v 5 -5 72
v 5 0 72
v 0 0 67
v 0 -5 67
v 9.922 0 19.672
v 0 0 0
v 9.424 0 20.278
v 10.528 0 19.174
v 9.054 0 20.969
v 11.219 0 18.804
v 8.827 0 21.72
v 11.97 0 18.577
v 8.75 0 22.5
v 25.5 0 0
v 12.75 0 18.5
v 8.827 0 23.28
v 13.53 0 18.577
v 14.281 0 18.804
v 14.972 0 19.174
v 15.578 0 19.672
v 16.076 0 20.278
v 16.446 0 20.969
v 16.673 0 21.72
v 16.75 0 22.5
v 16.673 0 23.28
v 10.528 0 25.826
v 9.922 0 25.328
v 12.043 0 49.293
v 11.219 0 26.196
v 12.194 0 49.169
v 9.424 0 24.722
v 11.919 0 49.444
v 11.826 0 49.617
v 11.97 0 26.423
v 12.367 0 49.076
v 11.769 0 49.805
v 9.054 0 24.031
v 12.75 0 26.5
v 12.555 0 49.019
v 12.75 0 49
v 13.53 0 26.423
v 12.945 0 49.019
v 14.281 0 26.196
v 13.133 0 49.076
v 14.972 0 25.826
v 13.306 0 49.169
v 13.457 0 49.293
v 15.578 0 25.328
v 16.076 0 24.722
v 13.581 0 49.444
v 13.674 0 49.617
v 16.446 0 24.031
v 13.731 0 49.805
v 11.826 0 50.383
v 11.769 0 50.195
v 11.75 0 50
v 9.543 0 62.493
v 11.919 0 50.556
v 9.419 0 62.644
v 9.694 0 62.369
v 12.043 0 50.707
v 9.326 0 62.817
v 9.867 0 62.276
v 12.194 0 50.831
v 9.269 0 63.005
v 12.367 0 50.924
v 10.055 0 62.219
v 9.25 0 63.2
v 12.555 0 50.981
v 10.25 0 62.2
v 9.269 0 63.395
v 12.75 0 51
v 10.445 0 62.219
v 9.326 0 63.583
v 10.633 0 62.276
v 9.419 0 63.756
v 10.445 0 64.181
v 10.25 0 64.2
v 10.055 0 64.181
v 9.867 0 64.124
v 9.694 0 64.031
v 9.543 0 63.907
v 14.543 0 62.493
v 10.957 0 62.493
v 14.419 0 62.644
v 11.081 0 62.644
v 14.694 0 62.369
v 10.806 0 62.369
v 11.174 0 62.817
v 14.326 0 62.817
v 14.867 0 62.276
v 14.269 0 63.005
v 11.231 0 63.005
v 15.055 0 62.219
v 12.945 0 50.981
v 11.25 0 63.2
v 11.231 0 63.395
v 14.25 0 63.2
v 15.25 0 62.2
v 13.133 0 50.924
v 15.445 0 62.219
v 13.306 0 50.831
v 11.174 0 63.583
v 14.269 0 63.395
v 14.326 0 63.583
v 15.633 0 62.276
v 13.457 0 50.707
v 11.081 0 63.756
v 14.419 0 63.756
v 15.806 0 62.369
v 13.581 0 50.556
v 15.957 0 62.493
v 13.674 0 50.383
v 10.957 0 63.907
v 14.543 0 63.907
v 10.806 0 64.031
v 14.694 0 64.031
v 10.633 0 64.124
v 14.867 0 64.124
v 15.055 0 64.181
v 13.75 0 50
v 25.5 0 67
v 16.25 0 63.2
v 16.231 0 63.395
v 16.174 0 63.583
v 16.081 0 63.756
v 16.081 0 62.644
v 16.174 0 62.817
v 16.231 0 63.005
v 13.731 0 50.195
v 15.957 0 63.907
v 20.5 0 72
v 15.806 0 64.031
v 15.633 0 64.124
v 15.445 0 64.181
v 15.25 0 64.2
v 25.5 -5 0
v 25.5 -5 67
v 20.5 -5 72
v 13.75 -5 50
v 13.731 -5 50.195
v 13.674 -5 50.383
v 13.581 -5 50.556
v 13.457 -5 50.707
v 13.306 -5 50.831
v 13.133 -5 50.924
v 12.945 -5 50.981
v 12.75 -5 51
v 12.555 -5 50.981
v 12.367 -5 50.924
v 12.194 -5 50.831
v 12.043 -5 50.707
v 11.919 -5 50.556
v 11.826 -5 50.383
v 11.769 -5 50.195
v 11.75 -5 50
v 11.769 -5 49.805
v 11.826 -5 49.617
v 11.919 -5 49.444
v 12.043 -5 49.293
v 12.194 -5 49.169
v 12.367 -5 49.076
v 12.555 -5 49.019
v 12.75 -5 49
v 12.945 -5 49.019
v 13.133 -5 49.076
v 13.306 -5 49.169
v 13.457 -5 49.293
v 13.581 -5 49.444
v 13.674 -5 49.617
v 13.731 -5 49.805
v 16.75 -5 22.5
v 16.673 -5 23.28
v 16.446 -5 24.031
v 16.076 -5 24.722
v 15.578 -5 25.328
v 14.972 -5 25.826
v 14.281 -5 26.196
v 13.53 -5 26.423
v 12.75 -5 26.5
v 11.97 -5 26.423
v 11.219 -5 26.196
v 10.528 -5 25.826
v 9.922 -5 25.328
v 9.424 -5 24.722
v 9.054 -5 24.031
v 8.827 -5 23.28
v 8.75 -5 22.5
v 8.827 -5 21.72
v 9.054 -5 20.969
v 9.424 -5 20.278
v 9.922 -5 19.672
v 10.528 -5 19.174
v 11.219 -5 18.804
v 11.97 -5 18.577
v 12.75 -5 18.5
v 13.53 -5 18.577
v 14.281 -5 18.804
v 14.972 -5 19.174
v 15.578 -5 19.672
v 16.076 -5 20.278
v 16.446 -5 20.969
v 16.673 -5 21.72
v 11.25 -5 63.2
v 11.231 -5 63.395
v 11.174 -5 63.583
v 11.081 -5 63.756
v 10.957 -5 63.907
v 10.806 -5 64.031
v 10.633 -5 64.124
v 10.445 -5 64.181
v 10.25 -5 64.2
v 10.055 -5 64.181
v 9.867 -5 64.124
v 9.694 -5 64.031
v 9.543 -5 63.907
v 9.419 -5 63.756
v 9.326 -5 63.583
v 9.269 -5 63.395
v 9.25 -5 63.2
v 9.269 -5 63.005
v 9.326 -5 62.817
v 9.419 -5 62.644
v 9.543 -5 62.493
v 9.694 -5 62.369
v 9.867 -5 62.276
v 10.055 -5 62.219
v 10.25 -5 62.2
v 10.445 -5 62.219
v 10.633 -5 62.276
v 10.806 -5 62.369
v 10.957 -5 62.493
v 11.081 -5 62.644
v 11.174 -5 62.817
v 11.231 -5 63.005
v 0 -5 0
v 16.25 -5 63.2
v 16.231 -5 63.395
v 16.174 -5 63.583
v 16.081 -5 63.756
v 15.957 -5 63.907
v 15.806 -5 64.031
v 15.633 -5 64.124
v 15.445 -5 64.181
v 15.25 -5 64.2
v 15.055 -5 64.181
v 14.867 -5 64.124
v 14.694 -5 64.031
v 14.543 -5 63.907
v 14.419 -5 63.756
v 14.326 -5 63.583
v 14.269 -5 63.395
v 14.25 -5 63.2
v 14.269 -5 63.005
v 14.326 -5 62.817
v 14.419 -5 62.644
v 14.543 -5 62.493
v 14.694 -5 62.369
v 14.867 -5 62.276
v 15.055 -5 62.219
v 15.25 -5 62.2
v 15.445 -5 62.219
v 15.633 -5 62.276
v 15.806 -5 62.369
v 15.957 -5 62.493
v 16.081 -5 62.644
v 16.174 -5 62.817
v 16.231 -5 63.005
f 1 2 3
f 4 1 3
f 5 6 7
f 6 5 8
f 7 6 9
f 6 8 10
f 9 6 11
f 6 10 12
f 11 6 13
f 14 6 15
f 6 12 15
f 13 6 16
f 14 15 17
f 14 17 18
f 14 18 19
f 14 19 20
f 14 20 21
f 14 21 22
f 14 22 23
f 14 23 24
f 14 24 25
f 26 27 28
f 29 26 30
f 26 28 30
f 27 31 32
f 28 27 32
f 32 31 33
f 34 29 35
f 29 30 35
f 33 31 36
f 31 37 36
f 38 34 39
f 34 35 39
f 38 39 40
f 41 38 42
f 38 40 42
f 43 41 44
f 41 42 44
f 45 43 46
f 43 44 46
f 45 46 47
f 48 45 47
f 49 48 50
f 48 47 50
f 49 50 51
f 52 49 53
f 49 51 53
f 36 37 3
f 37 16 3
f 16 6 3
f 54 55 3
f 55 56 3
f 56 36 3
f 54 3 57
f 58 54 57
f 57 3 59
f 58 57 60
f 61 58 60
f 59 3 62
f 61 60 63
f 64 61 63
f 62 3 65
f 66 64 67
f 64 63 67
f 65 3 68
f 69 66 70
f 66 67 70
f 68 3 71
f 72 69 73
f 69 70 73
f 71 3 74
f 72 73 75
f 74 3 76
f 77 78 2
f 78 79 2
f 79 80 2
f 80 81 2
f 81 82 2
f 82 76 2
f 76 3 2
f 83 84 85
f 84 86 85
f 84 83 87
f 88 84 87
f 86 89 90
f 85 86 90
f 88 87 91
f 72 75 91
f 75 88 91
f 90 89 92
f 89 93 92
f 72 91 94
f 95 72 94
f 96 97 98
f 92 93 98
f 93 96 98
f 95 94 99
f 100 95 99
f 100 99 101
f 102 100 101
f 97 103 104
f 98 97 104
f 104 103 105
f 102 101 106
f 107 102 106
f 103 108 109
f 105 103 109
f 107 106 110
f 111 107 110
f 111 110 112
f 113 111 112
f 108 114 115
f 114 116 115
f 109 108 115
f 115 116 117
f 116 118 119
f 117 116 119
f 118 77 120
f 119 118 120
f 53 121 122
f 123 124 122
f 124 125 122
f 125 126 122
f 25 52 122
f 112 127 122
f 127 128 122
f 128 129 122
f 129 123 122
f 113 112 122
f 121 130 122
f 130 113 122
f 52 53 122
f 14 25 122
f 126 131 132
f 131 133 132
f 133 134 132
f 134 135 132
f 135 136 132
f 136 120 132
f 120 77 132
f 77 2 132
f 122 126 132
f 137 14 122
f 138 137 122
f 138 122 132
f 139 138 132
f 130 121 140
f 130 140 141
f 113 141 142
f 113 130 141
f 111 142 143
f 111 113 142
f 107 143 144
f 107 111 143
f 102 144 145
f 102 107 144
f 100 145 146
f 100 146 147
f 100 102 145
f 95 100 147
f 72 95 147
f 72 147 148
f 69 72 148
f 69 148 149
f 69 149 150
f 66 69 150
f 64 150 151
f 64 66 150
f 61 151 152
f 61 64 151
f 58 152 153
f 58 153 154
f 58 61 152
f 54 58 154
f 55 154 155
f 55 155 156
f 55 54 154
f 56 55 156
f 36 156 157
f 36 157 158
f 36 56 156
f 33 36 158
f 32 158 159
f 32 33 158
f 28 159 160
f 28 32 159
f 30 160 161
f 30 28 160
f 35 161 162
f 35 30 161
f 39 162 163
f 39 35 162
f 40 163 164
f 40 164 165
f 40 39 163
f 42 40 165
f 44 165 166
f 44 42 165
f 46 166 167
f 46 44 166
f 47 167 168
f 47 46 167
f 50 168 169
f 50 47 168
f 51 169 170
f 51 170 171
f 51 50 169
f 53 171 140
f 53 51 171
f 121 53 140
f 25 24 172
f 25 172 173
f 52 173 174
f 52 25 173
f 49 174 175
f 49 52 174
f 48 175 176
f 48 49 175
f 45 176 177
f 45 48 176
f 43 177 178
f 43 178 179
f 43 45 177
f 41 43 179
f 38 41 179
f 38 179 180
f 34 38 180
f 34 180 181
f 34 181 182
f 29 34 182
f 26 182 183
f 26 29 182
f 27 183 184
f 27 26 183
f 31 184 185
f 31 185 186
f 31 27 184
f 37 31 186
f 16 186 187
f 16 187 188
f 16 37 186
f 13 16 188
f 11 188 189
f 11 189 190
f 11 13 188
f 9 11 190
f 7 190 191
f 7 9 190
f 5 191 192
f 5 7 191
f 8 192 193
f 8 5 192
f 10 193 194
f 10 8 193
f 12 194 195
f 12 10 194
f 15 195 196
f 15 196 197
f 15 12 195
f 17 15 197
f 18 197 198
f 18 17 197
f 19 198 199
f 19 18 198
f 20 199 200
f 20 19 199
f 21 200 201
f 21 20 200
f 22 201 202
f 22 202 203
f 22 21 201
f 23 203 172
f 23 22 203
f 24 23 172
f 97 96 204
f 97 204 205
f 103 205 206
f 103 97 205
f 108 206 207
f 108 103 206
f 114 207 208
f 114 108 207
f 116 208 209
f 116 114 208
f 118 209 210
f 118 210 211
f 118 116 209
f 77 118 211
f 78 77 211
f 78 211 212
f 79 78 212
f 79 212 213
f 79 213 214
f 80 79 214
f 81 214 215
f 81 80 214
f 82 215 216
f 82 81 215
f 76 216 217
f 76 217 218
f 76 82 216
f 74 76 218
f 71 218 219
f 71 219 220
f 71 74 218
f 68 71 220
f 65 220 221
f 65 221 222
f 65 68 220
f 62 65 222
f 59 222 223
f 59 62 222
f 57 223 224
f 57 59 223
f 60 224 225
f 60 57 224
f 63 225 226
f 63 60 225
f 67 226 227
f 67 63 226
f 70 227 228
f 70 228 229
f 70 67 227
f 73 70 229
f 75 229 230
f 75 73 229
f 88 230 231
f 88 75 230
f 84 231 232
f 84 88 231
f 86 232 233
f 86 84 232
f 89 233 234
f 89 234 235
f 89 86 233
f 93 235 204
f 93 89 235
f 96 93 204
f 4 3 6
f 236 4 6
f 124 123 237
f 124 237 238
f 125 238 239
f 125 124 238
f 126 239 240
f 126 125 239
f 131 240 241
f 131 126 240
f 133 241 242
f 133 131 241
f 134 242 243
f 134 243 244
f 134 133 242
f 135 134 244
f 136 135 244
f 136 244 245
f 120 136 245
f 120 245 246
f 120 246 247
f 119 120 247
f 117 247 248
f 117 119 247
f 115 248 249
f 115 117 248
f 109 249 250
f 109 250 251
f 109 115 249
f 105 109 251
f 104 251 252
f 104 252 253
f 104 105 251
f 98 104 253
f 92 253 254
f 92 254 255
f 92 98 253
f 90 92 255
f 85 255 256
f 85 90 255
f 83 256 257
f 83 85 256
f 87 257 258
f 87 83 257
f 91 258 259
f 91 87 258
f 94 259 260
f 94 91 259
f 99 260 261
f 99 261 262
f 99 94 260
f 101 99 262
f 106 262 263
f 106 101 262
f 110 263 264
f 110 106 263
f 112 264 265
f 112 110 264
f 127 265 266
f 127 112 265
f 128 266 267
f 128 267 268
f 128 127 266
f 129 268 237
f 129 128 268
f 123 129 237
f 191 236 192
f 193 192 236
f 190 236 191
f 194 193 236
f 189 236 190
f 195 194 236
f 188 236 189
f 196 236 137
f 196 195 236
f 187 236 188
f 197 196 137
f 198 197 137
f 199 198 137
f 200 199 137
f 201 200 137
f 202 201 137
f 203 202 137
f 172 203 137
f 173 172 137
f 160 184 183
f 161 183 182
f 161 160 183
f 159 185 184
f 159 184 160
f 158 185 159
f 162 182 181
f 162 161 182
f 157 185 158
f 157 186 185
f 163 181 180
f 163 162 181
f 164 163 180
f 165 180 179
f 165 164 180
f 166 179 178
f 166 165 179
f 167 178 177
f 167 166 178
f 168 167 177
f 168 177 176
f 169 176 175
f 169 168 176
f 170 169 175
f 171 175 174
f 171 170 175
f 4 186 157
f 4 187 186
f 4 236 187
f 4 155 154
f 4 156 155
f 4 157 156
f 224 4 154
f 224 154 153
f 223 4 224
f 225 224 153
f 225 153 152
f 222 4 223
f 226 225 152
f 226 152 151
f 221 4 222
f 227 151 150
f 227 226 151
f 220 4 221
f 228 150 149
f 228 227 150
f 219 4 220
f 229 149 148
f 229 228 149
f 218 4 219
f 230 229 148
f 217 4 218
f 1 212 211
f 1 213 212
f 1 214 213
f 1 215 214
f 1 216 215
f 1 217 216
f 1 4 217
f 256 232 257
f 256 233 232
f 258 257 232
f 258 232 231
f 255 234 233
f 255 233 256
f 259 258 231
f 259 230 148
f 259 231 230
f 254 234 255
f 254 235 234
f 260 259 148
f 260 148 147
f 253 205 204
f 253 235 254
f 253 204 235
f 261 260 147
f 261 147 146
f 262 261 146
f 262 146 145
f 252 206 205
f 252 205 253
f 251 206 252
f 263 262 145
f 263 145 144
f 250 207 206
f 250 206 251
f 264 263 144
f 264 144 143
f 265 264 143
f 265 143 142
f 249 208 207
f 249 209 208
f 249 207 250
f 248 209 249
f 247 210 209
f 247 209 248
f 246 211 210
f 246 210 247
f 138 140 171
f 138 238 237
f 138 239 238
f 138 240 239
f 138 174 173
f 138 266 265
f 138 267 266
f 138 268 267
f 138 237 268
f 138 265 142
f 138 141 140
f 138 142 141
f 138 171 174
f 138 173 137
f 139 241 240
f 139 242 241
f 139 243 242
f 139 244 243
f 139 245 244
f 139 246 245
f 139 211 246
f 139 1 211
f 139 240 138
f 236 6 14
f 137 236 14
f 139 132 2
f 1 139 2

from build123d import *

# Parameters (mm, degrees)
F0_R     = 4
F0_R_2   = 1
F1_DEPTH = 5


with BuildPart() as f1:
    # F0 (on Front) → F1 (new body)
    with BuildSketch(Plane.XZ):
        Polygon((0, 67), (0, 0), (25.5, 0), (25.5, 67), (20.5, 72), (5, 72), align=None)
        with Locations((12.75, 22.5)):
            Circle(F0_R, mode=Mode.SUBTRACT)
        with Locations((10.25, 63.2)):
            Circle(F0_R_2, mode=Mode.SUBTRACT)
        with Locations((12.75, 50)):
            Circle(F0_R_2, mode=Mode.SUBTRACT)
        with Locations((15.25, 63.2)):
            Circle(F0_R_2, mode=Mode.SUBTRACT)
    extrude(amount=F1_DEPTH)


solid = f1.part
